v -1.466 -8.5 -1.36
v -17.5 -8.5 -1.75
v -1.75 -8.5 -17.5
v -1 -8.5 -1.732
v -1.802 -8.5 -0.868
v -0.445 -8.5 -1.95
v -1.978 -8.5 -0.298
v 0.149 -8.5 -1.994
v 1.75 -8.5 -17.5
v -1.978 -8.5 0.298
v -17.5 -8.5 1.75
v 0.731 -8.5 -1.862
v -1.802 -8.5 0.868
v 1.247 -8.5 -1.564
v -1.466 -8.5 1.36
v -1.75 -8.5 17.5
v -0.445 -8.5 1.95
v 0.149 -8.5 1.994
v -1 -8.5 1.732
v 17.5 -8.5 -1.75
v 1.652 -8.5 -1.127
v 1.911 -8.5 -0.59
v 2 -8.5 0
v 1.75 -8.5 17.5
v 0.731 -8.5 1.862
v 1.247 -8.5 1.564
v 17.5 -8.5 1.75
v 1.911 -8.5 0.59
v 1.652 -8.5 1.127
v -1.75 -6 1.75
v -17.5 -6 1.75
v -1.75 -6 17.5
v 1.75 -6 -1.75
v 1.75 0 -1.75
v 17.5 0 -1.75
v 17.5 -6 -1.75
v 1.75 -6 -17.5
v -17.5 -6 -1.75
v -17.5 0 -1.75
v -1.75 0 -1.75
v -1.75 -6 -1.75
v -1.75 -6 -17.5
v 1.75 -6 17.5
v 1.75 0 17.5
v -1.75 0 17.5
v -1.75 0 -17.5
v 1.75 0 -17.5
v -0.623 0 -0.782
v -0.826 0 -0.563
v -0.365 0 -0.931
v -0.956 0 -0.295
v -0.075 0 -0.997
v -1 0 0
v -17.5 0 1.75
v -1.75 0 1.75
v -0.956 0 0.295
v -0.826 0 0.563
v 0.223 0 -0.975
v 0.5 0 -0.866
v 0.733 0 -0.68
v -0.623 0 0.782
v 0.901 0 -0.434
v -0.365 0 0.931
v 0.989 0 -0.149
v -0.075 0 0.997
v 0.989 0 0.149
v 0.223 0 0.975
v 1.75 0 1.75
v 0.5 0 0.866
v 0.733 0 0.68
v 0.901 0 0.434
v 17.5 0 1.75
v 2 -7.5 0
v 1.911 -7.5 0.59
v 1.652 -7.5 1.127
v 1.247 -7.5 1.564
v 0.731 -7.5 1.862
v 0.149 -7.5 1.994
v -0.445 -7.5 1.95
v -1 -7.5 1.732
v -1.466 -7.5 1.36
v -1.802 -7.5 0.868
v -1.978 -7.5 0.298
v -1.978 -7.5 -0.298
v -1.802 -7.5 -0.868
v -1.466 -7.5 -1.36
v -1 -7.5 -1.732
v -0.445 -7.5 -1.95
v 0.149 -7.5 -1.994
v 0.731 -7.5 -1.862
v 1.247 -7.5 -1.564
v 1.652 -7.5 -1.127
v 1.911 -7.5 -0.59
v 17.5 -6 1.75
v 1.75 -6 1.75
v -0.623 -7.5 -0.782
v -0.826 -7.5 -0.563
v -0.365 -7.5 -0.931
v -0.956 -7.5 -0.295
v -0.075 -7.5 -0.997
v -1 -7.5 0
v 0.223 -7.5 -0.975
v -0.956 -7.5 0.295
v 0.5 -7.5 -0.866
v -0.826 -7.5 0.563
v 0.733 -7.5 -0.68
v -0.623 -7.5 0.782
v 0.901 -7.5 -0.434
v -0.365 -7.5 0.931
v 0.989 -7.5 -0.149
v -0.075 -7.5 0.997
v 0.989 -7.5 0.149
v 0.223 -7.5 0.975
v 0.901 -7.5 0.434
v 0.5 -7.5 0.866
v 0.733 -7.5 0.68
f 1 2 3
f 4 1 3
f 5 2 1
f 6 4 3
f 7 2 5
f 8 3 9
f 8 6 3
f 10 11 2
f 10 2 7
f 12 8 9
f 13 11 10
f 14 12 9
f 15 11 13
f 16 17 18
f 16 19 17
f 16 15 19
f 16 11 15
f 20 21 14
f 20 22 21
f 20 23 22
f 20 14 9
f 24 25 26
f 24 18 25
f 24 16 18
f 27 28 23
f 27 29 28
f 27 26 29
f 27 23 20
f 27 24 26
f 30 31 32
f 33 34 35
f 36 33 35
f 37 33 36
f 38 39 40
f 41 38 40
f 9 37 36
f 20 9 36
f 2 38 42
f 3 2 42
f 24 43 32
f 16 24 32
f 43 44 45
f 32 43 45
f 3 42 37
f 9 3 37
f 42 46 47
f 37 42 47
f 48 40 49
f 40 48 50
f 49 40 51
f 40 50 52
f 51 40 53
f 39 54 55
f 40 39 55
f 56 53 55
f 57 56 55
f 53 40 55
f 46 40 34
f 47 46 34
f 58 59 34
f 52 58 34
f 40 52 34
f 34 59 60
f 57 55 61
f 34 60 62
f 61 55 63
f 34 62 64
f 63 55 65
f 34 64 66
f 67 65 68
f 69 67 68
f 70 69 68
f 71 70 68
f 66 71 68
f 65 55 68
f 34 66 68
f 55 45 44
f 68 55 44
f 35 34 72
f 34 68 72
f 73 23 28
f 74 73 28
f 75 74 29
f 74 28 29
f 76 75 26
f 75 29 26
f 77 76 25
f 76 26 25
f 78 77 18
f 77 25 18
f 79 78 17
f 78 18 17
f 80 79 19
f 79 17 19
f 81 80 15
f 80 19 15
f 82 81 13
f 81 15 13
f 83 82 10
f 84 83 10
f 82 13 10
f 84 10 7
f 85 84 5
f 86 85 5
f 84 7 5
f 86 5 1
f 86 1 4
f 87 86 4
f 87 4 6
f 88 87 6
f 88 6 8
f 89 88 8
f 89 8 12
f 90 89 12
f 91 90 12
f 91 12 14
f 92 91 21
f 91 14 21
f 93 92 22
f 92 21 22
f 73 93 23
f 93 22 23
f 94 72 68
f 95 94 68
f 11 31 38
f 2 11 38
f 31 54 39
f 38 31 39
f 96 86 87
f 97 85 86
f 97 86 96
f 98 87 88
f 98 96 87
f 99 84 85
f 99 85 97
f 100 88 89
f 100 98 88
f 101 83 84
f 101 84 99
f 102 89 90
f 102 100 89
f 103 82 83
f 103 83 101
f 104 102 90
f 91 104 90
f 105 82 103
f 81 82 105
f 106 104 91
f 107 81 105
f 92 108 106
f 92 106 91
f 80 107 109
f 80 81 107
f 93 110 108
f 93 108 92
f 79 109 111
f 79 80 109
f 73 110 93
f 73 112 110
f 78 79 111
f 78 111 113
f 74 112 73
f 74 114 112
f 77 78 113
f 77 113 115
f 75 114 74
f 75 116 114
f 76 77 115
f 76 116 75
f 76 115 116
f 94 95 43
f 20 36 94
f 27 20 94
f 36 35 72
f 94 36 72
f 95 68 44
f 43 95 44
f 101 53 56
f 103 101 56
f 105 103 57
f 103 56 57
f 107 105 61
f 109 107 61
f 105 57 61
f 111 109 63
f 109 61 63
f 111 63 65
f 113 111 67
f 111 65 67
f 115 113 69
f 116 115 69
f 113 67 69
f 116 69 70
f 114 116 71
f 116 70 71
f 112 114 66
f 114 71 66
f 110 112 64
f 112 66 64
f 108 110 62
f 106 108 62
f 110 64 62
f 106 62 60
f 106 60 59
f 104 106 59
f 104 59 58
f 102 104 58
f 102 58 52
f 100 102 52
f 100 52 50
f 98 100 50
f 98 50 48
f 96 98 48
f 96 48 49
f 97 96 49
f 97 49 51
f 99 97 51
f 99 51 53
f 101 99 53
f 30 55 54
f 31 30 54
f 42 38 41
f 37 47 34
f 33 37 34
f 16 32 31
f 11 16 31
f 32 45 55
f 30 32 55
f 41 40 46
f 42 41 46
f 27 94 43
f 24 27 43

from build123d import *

# Parameters (mm, degrees)
F1_DEPTH = 6
F3_DEPTH = 2.5
F4_R     = 1
F5_DEPTH = 8.501
F6_R     = 2
F7_DEPTH = 1


with BuildPart() as f1:
    # F0 (on Front) → F1 (new body)
    with BuildSketch(Plane.XZ):
        Polygon((1.75, 1.75), (1.75, 17.5), (-1.75, 17.5), (-1.75, 1.75), (-17.5, 1.75), (-17.5, -1.75), (-1.75, -1.75), (-1.75, -17.5), (1.75, -17.5), (1.75, -1.75), (17.5, -1.75), (17.5, 1.75), align=None)
    extrude(amount=F1_DEPTH)

    # F2 (on face) → F3 (join)
    with BuildSketch(Plane.XZ.offset(6)):
        Polygon((-1.75, 17.5), (-17.5, 1.75), (-17.5, 0), (-17.5, -1.75), (-1.75, -17.5), (0, -17.5), (1.75, -17.5), (17.5, -1.75), (17.5, 0), (17.5, 1.75), (1.75, 17.5), (0, 17.5), align=None)
    extrude(amount=F3_DEPTH)

    # F4 (on face) → F5 (cut, through all)
    with BuildSketch(Plane(origin=(0, 0, 0), x_dir=(-1, 0, 0), z_dir=(0, 1, 0))):
        Circle(F4_R)
    extrude(amount=-F5_DEPTH, mode=Mode.SUBTRACT)

    # F6 (on face) → F7 (cut)
    with BuildSketch(Plane.XZ.offset(8.5)):
        Circle(F6_R)
    extrude(amount=-F7_DEPTH, mode=Mode.SUBTRACT)


solid = f1.part
